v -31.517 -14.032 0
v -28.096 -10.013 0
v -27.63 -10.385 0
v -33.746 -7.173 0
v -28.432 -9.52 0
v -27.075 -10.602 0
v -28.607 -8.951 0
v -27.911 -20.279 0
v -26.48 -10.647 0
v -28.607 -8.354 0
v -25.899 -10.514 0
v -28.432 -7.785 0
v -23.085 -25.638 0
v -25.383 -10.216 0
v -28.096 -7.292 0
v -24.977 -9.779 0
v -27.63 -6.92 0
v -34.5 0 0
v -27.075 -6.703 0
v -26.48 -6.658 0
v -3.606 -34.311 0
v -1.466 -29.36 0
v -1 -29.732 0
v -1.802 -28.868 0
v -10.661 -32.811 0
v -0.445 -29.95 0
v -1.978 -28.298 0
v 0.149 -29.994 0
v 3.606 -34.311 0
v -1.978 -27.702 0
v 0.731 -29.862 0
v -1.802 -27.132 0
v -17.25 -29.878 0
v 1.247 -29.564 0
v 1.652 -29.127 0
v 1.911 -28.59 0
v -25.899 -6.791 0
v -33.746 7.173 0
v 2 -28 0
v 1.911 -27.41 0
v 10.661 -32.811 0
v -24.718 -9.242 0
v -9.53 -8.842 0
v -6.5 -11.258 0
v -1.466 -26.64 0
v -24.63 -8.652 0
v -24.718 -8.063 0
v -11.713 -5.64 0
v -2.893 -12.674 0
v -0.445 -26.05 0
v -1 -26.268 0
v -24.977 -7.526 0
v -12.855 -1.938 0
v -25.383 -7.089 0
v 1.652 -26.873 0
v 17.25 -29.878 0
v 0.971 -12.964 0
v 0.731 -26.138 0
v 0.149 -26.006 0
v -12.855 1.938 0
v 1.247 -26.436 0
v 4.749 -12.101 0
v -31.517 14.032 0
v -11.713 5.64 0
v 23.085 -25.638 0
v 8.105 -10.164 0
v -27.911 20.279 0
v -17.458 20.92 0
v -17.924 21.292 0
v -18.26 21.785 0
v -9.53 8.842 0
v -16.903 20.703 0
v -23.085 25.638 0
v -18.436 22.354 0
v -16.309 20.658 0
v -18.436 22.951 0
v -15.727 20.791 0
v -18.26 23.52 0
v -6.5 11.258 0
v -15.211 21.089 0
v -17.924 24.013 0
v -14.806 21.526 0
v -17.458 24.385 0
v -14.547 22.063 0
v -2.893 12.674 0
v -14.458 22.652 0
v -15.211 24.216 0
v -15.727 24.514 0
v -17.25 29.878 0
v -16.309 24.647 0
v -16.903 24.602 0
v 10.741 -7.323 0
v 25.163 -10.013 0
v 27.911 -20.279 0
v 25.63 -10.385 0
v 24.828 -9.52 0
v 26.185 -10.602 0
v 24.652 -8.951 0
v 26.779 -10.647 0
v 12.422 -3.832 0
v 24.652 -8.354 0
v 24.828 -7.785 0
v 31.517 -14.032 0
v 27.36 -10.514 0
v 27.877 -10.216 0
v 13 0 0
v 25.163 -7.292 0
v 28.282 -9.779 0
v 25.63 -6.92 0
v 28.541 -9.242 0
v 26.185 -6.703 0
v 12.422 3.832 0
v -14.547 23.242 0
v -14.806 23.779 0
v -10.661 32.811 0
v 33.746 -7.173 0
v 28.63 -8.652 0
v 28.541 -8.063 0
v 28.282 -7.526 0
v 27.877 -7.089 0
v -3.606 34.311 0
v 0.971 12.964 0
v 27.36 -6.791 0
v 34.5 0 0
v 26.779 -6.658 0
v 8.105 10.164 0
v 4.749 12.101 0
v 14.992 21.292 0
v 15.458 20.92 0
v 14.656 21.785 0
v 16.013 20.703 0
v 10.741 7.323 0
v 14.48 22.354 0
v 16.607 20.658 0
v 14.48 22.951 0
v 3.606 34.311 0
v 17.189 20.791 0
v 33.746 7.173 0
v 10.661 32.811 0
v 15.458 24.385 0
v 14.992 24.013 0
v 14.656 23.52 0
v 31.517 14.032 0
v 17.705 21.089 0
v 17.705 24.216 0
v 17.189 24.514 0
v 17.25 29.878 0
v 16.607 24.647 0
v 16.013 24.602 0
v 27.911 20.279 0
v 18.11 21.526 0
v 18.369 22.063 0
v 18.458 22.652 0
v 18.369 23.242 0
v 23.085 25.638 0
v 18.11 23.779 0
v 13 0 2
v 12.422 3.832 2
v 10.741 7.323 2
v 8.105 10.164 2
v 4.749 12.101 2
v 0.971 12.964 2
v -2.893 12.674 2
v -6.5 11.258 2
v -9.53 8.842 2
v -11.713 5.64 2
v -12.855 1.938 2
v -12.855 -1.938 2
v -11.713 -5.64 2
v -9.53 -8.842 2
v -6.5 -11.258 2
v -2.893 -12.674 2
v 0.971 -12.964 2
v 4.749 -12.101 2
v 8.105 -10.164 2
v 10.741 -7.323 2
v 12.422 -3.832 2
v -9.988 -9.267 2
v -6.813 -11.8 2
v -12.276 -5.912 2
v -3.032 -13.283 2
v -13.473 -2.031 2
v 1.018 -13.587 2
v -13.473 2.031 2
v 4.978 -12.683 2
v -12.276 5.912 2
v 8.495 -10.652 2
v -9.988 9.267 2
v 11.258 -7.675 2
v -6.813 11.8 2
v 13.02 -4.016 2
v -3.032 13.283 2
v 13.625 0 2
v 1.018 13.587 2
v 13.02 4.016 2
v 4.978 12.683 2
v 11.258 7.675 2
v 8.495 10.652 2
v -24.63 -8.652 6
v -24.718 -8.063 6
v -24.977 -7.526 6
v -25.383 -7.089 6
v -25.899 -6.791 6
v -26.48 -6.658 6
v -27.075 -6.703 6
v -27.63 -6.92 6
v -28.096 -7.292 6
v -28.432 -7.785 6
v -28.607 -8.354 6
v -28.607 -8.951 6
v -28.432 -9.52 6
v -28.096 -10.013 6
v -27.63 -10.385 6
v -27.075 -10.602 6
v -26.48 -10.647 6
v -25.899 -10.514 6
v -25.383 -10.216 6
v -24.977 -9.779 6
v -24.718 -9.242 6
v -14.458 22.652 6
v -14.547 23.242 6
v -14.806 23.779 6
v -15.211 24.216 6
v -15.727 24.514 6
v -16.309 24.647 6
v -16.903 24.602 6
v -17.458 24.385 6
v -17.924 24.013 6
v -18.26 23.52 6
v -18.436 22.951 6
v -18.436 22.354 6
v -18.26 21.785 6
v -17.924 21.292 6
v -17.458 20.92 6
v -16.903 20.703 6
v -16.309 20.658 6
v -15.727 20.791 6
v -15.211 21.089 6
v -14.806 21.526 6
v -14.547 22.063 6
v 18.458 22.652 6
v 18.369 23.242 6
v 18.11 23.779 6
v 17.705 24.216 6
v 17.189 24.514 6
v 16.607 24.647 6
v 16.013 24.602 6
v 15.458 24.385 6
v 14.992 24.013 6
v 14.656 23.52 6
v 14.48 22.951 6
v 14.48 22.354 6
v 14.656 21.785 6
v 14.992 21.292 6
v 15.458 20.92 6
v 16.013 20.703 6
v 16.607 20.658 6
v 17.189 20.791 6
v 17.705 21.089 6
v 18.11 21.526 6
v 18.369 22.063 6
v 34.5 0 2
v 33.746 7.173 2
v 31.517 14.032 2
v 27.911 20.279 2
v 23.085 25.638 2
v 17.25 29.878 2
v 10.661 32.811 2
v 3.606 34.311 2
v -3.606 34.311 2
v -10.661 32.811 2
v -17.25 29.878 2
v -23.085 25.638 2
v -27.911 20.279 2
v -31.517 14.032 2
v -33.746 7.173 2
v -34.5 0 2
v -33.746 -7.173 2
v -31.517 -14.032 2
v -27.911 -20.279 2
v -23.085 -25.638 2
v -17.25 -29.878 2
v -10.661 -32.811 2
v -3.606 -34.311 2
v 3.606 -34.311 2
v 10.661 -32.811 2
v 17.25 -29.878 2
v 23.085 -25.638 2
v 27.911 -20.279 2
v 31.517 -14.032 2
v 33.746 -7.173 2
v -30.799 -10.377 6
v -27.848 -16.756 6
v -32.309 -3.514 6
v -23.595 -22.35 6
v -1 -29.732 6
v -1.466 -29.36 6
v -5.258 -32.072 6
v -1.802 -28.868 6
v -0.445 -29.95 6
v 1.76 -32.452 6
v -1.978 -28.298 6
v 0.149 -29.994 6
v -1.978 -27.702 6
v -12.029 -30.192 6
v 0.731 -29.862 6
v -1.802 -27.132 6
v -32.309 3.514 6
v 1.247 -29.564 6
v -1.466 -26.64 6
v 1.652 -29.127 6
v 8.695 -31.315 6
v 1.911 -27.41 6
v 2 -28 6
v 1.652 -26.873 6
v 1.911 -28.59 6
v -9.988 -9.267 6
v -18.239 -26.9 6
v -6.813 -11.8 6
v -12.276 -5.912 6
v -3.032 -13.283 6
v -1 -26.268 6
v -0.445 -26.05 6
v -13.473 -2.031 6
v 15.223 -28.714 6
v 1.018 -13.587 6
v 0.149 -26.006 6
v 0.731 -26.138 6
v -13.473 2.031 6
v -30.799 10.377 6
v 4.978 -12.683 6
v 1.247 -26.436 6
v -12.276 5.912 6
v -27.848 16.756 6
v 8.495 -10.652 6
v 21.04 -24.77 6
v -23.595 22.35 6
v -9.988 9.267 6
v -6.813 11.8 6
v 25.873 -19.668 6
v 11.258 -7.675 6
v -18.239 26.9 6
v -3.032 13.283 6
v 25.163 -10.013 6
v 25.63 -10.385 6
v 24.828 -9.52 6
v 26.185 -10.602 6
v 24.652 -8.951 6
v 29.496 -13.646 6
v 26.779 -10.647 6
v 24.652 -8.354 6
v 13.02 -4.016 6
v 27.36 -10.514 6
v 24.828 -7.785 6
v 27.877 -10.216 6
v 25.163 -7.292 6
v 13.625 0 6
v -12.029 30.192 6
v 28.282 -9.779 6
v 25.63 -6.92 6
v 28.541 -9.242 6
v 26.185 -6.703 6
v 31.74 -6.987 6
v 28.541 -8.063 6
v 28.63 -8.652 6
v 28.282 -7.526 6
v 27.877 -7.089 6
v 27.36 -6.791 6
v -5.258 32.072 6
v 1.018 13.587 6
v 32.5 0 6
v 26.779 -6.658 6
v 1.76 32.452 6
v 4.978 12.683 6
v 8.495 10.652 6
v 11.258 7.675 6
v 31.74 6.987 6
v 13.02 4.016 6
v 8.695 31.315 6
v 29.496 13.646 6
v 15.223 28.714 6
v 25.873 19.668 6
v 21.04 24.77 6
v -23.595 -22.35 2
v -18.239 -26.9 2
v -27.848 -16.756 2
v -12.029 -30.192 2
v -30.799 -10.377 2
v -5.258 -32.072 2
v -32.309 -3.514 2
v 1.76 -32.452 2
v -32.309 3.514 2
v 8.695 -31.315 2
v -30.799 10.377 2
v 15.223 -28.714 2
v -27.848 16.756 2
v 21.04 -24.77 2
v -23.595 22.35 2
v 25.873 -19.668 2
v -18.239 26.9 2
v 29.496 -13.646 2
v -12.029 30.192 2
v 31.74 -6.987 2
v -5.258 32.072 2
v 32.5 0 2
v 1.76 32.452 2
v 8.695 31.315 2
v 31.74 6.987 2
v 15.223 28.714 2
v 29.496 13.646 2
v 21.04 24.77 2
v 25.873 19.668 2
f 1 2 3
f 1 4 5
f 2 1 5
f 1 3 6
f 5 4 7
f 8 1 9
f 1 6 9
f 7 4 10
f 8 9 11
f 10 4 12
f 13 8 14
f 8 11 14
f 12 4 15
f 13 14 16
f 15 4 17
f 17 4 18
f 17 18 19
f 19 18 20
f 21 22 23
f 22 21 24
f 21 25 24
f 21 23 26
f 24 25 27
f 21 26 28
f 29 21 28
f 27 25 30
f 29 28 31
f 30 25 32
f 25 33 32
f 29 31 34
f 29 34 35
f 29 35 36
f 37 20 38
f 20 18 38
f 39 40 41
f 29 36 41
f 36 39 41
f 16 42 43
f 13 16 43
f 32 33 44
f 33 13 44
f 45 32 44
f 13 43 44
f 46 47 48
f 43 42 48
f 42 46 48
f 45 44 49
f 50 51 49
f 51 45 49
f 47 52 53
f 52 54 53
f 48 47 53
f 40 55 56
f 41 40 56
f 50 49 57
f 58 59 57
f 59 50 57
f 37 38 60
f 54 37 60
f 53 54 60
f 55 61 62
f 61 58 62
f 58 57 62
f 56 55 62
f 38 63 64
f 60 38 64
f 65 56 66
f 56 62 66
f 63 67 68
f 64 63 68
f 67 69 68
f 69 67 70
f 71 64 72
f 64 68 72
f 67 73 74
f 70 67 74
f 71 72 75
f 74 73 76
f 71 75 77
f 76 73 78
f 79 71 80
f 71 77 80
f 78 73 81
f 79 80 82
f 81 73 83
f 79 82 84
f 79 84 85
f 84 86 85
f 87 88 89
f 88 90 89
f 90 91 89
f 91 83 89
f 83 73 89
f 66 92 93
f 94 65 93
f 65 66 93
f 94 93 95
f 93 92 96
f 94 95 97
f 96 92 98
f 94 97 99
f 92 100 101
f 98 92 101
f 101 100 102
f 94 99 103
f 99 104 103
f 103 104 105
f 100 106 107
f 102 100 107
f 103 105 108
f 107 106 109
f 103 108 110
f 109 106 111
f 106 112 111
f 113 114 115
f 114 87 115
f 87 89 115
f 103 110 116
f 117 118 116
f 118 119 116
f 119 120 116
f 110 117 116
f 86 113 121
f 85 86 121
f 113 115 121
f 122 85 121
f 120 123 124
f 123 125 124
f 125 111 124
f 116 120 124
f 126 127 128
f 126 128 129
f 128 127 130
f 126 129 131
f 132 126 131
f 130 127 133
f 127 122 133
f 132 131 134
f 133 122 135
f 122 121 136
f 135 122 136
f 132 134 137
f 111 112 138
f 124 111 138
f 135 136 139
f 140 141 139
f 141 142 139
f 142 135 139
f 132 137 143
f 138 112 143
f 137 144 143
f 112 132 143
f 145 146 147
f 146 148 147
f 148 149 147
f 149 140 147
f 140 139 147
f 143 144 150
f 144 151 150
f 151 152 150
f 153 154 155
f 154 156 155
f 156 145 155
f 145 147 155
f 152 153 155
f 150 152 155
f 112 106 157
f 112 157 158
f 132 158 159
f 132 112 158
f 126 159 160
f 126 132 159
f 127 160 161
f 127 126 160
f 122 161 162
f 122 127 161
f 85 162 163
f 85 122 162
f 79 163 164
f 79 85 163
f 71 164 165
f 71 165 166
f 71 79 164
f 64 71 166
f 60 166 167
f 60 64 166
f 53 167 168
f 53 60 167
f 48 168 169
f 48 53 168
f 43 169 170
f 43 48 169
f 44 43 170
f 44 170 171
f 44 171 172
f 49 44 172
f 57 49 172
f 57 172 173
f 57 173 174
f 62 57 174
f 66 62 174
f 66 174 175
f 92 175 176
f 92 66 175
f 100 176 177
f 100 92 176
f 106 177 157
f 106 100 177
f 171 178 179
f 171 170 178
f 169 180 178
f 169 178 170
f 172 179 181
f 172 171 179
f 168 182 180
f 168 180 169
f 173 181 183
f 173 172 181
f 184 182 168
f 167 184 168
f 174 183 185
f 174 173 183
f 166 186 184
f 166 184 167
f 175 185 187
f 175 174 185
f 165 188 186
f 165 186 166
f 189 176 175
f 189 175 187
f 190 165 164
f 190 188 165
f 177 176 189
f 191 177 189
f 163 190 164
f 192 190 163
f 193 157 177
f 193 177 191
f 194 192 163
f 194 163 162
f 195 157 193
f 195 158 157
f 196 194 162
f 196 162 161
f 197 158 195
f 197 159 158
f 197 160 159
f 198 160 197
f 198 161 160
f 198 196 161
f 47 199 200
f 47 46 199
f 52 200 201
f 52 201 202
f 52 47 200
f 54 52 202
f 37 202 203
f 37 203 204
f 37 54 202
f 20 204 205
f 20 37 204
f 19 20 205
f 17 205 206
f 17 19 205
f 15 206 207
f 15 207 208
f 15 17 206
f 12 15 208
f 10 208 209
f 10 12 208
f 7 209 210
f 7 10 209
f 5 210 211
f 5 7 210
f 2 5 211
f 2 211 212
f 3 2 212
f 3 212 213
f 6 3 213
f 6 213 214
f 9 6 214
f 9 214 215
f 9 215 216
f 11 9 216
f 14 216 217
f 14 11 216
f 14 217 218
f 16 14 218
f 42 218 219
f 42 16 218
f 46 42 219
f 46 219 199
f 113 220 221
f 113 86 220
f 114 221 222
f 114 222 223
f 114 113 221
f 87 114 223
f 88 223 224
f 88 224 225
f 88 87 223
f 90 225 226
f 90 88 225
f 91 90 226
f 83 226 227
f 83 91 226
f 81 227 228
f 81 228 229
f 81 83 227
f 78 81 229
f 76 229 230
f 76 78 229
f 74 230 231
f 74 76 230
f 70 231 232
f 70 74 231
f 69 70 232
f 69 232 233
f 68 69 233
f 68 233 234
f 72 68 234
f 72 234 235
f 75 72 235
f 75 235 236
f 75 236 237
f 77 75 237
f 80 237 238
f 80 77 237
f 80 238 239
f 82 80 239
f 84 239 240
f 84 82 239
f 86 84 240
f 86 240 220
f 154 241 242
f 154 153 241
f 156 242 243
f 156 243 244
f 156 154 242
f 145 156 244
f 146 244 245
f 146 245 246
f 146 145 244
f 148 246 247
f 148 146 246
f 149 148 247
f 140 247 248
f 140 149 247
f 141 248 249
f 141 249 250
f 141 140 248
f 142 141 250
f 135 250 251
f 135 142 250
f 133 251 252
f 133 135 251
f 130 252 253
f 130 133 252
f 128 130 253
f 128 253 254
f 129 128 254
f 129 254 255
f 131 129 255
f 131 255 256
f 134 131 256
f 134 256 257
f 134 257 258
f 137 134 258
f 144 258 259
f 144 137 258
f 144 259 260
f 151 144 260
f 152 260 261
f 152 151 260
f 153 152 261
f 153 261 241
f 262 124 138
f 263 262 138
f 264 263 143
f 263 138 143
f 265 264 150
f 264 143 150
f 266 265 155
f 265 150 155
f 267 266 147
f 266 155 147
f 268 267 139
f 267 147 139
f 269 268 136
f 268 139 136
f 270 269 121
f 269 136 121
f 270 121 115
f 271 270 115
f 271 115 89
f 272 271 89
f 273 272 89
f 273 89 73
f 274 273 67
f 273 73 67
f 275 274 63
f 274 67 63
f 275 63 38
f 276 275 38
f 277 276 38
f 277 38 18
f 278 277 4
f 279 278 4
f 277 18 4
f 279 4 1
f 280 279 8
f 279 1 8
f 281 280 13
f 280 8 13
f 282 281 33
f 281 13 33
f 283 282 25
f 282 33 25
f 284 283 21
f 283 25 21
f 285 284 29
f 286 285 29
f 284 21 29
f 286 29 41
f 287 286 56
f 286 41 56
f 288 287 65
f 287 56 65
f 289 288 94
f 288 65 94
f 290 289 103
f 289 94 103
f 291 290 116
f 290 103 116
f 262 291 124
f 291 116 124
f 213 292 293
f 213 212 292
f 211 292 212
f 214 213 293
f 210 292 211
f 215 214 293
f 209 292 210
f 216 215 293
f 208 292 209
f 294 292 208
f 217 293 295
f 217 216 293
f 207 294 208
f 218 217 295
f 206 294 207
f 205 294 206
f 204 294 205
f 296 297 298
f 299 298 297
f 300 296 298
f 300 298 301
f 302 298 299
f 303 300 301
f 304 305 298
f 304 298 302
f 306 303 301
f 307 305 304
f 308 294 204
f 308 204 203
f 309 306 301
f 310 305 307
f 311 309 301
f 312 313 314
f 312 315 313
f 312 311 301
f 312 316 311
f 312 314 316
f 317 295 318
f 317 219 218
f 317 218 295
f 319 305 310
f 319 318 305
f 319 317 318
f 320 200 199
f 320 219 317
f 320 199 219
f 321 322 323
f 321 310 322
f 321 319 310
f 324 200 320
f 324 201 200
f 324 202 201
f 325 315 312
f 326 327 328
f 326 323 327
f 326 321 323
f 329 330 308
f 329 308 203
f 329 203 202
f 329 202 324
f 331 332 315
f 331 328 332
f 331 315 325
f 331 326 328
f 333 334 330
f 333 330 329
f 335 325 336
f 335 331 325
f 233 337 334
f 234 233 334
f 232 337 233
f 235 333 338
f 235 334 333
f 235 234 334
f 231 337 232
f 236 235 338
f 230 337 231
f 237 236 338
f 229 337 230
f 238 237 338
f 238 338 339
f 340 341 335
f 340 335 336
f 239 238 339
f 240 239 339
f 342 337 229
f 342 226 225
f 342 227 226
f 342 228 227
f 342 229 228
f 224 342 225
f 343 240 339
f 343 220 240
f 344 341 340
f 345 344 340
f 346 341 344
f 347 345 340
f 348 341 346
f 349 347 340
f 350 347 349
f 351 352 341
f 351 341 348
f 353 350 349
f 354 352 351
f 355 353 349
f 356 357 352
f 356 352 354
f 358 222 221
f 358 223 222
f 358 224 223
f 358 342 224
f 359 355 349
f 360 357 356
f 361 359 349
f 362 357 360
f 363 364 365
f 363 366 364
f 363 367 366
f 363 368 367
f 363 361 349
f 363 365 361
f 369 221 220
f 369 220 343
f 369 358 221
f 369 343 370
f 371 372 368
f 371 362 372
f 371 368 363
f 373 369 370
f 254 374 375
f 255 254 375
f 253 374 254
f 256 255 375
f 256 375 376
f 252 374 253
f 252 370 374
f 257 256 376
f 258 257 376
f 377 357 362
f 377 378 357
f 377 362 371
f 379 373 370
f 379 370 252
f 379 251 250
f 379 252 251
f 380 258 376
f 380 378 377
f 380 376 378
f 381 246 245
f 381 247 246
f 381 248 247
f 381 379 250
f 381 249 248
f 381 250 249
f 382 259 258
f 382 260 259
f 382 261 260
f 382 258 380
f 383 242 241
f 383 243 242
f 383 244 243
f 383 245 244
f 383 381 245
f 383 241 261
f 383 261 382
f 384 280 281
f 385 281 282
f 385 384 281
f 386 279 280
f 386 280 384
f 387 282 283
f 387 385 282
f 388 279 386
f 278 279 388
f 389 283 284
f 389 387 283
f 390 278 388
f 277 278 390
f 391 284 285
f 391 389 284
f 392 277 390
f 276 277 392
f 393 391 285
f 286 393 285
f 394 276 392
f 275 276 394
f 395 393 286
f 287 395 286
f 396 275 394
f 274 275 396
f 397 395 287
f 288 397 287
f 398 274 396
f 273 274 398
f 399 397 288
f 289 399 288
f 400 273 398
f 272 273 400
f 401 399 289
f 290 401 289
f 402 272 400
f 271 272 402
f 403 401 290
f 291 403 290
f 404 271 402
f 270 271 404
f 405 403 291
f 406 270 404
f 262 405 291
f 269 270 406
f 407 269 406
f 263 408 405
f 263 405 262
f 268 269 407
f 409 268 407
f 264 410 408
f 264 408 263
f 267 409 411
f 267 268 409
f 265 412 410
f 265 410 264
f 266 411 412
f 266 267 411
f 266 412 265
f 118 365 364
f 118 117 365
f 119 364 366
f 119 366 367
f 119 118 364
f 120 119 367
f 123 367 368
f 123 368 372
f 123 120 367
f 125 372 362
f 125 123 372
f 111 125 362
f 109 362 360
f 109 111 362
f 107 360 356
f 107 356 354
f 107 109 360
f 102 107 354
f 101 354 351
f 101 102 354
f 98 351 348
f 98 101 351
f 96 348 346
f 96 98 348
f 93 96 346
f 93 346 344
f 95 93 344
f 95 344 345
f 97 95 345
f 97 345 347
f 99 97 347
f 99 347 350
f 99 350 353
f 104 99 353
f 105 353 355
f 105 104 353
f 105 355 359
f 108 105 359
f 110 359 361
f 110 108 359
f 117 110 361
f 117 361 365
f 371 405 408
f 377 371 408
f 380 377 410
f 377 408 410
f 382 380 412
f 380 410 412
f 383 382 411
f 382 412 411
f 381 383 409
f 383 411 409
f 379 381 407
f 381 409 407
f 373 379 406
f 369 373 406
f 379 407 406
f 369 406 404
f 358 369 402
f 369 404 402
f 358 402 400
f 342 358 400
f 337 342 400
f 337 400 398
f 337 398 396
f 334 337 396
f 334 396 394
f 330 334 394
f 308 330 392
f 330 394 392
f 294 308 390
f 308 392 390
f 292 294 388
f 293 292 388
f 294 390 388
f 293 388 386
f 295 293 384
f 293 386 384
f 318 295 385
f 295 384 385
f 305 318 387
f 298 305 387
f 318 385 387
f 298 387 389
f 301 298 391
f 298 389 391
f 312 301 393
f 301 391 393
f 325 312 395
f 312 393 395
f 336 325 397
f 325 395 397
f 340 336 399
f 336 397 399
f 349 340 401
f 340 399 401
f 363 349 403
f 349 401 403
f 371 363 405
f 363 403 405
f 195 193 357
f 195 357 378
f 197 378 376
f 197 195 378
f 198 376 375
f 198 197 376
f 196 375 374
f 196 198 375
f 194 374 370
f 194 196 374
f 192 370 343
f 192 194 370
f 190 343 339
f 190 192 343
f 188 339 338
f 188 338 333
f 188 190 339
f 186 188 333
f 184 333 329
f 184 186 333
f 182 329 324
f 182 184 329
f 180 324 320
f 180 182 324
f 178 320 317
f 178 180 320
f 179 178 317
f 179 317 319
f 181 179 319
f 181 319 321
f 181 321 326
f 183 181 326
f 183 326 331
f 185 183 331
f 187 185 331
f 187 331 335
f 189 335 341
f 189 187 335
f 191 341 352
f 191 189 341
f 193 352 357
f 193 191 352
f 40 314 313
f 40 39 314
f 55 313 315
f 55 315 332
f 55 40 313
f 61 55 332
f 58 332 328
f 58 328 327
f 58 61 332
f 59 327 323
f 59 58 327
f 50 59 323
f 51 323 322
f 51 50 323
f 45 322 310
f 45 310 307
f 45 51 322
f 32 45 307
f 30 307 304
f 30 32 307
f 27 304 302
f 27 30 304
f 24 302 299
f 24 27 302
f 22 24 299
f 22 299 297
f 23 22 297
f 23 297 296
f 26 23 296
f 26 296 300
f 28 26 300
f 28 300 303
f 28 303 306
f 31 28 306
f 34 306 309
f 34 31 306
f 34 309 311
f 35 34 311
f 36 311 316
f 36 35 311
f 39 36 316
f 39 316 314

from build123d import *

# Parameters (mm, degrees)
SKETCH_1_R      = 34.5
SKETCH_1_R_2    = 13
SKETCH_1_R_3    = 2
EXTRUDE_1_DEPTH = 2
SKETCH_2_R      = 32.5
SKETCH_2_R_2    = 13.625
SKETCH_2_R_3    = 2
EXTRUDE_2_DEPTH = 4


with BuildPart() as part:
    # 草图1 → 凸台-拉伸1 (new body)
    with BuildSketch(Plane.XY):
        Circle(SKETCH_1_R)
        Circle(SKETCH_1_R_2, mode=Mode.SUBTRACT)
        with Locations((0, -28)):
            Circle(SKETCH_1_R_3, mode=Mode.SUBTRACT)
        with Locations((-26.629582456, -8.652475842)):
            Circle(SKETCH_1_R_3, mode=Mode.SUBTRACT)
        with Locations((-16.457987064, 22.652475842)):
            Circle(SKETCH_1_R_3, mode=Mode.SUBTRACT)
        with Locations((16.457987064, 22.652475842)):
            Circle(SKETCH_1_R_3, mode=Mode.SUBTRACT)
        with Locations((26.629582456, -8.652475842)):
            Circle(SKETCH_1_R_3, mode=Mode.SUBTRACT)
    extrude(amount=EXTRUDE_1_DEPTH)

    # 草图2 → 凸台-拉伸2 (add)
    with BuildSketch(Plane.XY.offset(2)):
        Circle(SKETCH_2_R)
        Circle(SKETCH_2_R_2, mode=Mode.SUBTRACT)
        with Locations((0, -28)):
            Circle(SKETCH_2_R_3, mode=Mode.SUBTRACT)
        with Locations((-26.629582456, -8.652475842)):
            Circle(SKETCH_2_R_3, mode=Mode.SUBTRACT)
        with Locations((-16.457987064, 22.652475842)):
            Circle(SKETCH_2_R_3, mode=Mode.SUBTRACT)
        with Locations((16.457987064, 22.652475842)):
            Circle(SKETCH_2_R_3, mode=Mode.SUBTRACT)
        with Locations((26.629582456, -8.652475842)):
            Circle(SKETCH_2_R_3, mode=Mode.SUBTRACT)
    extrude(amount=EXTRUDE_2_DEPTH)


solid = part.part
